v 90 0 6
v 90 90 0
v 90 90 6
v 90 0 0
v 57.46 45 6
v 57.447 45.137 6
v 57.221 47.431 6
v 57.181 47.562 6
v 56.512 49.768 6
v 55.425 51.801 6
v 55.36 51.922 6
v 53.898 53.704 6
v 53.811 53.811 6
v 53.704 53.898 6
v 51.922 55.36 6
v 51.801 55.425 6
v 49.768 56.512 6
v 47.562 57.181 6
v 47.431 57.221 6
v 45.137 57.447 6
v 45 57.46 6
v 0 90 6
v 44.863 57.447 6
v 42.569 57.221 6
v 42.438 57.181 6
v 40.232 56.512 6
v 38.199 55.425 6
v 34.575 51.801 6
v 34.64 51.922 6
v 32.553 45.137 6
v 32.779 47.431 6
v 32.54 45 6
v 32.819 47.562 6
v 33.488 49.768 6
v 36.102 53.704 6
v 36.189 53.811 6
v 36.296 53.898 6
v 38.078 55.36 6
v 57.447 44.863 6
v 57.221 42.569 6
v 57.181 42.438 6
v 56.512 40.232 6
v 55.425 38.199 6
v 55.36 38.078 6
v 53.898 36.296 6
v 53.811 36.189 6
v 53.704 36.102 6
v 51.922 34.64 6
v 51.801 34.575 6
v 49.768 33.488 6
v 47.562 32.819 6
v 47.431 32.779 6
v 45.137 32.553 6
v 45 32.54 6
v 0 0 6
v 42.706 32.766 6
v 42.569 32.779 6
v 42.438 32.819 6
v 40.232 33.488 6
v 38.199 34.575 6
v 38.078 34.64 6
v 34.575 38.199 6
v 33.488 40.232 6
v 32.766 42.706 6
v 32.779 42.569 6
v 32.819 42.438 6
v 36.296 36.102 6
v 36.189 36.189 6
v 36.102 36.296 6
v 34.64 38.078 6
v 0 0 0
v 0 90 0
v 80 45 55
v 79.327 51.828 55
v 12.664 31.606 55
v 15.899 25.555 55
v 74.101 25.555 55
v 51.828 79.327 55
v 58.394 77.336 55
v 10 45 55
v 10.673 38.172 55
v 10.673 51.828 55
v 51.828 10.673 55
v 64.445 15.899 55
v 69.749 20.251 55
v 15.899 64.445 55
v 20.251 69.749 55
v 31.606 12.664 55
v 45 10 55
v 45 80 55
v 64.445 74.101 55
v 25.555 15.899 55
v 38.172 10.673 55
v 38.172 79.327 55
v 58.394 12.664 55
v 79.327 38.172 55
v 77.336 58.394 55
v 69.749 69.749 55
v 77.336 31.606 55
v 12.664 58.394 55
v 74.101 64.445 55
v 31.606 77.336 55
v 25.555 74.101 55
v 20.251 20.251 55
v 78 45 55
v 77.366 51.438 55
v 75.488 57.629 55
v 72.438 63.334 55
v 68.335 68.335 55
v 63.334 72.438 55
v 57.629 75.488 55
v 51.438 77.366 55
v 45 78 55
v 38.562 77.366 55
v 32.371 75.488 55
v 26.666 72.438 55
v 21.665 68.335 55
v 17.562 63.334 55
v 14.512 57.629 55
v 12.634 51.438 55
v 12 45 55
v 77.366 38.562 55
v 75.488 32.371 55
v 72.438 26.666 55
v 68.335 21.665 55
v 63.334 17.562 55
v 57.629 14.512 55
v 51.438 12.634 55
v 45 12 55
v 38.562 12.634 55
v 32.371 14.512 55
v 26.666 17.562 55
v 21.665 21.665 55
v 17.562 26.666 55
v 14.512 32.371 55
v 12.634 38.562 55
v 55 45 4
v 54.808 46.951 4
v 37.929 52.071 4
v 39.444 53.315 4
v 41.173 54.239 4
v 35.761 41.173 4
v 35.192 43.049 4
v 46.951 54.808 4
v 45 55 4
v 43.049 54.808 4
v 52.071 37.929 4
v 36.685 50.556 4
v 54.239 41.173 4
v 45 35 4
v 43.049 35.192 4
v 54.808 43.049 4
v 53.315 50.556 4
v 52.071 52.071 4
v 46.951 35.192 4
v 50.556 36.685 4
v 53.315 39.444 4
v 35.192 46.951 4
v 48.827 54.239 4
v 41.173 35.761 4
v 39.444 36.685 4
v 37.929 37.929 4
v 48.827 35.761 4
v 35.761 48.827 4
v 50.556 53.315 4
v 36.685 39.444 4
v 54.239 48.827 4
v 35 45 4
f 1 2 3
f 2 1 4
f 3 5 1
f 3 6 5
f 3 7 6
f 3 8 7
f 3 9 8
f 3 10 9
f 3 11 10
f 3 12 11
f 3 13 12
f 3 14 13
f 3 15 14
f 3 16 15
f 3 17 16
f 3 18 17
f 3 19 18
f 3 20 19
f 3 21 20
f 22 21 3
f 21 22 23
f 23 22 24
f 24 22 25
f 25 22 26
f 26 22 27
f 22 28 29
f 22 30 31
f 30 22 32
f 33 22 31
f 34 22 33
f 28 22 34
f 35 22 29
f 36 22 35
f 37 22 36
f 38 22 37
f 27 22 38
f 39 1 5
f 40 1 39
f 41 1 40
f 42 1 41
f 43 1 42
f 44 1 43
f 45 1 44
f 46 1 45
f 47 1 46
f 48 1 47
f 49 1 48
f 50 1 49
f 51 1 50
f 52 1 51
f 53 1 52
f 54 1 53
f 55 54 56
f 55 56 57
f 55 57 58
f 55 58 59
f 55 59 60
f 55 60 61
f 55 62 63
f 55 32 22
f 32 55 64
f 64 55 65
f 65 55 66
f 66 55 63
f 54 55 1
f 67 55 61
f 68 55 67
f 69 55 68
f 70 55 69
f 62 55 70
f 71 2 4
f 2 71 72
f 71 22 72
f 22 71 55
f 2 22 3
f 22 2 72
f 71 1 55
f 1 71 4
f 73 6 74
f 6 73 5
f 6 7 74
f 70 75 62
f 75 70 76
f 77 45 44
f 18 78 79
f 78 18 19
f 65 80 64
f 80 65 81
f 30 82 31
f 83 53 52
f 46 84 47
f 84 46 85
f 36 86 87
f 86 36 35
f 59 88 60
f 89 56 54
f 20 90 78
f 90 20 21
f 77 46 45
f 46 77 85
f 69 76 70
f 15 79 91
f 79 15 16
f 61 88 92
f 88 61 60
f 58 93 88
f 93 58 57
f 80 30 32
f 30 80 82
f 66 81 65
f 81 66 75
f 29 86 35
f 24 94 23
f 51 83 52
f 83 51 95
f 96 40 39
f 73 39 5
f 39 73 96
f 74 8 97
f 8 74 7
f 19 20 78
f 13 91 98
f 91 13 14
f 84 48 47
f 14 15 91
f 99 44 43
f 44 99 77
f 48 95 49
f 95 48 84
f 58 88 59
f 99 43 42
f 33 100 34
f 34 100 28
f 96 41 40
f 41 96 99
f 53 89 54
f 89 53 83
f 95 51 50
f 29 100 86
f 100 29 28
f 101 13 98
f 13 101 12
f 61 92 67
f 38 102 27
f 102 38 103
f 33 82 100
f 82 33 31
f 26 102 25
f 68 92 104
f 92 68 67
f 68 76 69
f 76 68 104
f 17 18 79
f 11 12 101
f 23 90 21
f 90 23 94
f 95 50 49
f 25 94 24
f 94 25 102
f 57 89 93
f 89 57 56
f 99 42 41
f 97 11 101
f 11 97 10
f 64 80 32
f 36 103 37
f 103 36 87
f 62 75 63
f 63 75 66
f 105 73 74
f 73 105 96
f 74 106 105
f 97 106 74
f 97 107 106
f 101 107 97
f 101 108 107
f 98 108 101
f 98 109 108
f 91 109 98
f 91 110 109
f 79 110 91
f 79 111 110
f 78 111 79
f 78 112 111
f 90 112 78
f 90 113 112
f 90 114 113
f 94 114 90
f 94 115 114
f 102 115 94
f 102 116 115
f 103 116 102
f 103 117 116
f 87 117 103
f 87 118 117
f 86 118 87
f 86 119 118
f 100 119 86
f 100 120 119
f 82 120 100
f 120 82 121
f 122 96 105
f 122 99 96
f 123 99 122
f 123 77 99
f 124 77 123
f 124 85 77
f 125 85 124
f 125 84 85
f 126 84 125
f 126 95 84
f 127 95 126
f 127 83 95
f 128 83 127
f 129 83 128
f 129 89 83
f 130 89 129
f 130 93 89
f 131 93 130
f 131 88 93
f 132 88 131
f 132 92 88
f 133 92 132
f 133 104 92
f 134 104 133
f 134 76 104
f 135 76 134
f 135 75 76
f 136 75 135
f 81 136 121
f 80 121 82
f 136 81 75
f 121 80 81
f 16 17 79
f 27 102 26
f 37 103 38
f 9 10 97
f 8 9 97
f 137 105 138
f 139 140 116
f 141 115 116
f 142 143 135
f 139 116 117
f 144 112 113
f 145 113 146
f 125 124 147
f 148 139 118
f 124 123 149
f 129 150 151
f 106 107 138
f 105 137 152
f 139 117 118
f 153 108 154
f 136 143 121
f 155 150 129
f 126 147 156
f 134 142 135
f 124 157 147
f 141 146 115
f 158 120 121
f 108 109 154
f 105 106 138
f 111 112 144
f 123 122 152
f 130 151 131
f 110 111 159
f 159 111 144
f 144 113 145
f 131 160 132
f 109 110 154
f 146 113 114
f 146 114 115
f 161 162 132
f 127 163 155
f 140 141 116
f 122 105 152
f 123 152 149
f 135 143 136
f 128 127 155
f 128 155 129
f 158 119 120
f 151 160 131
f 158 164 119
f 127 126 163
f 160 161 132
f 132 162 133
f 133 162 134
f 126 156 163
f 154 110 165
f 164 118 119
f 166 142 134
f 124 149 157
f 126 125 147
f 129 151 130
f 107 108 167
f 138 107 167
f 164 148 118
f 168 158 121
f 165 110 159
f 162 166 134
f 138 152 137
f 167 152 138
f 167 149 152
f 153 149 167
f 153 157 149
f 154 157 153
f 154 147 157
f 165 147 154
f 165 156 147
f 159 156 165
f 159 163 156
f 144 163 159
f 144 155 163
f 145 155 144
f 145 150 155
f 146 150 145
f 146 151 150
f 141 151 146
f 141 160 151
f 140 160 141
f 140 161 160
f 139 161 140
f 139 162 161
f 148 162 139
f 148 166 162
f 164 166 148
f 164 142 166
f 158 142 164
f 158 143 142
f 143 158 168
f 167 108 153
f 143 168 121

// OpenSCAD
$fn = 32;

// ----------------------------------------------------------------------
// Hopper: funnel with square flange
// ----------------------------------------------------------------------

// --- parameters (mm) ---
fl = 90;                  // flange side, X and Y
fl_t = 6;                 // flange thickness
cone_h = 50;              // cone height above the flange
top_d = 70;               // cone mouth diameter
bot_d = 24;               // cone spout diameter
wall = 2;                 // cone wall thickness

bore_d = bot_d - 2 * wall;  // spout bore diameter
total_h = fl_t + cone_h - 1;  // overall height

difference() {
  union() {
    cube([fl, fl, fl_t]);
    translate([fl / 2, fl / 2, fl_t - 1])
      cylinder(h = cone_h, d1 = bot_d, d2 = top_d);
  }
  translate([fl / 2, fl / 2, fl_t - 2])
    cylinder(h = cone_h + 1, d1 = bore_d, d2 = top_d - 2 * wall);
}
